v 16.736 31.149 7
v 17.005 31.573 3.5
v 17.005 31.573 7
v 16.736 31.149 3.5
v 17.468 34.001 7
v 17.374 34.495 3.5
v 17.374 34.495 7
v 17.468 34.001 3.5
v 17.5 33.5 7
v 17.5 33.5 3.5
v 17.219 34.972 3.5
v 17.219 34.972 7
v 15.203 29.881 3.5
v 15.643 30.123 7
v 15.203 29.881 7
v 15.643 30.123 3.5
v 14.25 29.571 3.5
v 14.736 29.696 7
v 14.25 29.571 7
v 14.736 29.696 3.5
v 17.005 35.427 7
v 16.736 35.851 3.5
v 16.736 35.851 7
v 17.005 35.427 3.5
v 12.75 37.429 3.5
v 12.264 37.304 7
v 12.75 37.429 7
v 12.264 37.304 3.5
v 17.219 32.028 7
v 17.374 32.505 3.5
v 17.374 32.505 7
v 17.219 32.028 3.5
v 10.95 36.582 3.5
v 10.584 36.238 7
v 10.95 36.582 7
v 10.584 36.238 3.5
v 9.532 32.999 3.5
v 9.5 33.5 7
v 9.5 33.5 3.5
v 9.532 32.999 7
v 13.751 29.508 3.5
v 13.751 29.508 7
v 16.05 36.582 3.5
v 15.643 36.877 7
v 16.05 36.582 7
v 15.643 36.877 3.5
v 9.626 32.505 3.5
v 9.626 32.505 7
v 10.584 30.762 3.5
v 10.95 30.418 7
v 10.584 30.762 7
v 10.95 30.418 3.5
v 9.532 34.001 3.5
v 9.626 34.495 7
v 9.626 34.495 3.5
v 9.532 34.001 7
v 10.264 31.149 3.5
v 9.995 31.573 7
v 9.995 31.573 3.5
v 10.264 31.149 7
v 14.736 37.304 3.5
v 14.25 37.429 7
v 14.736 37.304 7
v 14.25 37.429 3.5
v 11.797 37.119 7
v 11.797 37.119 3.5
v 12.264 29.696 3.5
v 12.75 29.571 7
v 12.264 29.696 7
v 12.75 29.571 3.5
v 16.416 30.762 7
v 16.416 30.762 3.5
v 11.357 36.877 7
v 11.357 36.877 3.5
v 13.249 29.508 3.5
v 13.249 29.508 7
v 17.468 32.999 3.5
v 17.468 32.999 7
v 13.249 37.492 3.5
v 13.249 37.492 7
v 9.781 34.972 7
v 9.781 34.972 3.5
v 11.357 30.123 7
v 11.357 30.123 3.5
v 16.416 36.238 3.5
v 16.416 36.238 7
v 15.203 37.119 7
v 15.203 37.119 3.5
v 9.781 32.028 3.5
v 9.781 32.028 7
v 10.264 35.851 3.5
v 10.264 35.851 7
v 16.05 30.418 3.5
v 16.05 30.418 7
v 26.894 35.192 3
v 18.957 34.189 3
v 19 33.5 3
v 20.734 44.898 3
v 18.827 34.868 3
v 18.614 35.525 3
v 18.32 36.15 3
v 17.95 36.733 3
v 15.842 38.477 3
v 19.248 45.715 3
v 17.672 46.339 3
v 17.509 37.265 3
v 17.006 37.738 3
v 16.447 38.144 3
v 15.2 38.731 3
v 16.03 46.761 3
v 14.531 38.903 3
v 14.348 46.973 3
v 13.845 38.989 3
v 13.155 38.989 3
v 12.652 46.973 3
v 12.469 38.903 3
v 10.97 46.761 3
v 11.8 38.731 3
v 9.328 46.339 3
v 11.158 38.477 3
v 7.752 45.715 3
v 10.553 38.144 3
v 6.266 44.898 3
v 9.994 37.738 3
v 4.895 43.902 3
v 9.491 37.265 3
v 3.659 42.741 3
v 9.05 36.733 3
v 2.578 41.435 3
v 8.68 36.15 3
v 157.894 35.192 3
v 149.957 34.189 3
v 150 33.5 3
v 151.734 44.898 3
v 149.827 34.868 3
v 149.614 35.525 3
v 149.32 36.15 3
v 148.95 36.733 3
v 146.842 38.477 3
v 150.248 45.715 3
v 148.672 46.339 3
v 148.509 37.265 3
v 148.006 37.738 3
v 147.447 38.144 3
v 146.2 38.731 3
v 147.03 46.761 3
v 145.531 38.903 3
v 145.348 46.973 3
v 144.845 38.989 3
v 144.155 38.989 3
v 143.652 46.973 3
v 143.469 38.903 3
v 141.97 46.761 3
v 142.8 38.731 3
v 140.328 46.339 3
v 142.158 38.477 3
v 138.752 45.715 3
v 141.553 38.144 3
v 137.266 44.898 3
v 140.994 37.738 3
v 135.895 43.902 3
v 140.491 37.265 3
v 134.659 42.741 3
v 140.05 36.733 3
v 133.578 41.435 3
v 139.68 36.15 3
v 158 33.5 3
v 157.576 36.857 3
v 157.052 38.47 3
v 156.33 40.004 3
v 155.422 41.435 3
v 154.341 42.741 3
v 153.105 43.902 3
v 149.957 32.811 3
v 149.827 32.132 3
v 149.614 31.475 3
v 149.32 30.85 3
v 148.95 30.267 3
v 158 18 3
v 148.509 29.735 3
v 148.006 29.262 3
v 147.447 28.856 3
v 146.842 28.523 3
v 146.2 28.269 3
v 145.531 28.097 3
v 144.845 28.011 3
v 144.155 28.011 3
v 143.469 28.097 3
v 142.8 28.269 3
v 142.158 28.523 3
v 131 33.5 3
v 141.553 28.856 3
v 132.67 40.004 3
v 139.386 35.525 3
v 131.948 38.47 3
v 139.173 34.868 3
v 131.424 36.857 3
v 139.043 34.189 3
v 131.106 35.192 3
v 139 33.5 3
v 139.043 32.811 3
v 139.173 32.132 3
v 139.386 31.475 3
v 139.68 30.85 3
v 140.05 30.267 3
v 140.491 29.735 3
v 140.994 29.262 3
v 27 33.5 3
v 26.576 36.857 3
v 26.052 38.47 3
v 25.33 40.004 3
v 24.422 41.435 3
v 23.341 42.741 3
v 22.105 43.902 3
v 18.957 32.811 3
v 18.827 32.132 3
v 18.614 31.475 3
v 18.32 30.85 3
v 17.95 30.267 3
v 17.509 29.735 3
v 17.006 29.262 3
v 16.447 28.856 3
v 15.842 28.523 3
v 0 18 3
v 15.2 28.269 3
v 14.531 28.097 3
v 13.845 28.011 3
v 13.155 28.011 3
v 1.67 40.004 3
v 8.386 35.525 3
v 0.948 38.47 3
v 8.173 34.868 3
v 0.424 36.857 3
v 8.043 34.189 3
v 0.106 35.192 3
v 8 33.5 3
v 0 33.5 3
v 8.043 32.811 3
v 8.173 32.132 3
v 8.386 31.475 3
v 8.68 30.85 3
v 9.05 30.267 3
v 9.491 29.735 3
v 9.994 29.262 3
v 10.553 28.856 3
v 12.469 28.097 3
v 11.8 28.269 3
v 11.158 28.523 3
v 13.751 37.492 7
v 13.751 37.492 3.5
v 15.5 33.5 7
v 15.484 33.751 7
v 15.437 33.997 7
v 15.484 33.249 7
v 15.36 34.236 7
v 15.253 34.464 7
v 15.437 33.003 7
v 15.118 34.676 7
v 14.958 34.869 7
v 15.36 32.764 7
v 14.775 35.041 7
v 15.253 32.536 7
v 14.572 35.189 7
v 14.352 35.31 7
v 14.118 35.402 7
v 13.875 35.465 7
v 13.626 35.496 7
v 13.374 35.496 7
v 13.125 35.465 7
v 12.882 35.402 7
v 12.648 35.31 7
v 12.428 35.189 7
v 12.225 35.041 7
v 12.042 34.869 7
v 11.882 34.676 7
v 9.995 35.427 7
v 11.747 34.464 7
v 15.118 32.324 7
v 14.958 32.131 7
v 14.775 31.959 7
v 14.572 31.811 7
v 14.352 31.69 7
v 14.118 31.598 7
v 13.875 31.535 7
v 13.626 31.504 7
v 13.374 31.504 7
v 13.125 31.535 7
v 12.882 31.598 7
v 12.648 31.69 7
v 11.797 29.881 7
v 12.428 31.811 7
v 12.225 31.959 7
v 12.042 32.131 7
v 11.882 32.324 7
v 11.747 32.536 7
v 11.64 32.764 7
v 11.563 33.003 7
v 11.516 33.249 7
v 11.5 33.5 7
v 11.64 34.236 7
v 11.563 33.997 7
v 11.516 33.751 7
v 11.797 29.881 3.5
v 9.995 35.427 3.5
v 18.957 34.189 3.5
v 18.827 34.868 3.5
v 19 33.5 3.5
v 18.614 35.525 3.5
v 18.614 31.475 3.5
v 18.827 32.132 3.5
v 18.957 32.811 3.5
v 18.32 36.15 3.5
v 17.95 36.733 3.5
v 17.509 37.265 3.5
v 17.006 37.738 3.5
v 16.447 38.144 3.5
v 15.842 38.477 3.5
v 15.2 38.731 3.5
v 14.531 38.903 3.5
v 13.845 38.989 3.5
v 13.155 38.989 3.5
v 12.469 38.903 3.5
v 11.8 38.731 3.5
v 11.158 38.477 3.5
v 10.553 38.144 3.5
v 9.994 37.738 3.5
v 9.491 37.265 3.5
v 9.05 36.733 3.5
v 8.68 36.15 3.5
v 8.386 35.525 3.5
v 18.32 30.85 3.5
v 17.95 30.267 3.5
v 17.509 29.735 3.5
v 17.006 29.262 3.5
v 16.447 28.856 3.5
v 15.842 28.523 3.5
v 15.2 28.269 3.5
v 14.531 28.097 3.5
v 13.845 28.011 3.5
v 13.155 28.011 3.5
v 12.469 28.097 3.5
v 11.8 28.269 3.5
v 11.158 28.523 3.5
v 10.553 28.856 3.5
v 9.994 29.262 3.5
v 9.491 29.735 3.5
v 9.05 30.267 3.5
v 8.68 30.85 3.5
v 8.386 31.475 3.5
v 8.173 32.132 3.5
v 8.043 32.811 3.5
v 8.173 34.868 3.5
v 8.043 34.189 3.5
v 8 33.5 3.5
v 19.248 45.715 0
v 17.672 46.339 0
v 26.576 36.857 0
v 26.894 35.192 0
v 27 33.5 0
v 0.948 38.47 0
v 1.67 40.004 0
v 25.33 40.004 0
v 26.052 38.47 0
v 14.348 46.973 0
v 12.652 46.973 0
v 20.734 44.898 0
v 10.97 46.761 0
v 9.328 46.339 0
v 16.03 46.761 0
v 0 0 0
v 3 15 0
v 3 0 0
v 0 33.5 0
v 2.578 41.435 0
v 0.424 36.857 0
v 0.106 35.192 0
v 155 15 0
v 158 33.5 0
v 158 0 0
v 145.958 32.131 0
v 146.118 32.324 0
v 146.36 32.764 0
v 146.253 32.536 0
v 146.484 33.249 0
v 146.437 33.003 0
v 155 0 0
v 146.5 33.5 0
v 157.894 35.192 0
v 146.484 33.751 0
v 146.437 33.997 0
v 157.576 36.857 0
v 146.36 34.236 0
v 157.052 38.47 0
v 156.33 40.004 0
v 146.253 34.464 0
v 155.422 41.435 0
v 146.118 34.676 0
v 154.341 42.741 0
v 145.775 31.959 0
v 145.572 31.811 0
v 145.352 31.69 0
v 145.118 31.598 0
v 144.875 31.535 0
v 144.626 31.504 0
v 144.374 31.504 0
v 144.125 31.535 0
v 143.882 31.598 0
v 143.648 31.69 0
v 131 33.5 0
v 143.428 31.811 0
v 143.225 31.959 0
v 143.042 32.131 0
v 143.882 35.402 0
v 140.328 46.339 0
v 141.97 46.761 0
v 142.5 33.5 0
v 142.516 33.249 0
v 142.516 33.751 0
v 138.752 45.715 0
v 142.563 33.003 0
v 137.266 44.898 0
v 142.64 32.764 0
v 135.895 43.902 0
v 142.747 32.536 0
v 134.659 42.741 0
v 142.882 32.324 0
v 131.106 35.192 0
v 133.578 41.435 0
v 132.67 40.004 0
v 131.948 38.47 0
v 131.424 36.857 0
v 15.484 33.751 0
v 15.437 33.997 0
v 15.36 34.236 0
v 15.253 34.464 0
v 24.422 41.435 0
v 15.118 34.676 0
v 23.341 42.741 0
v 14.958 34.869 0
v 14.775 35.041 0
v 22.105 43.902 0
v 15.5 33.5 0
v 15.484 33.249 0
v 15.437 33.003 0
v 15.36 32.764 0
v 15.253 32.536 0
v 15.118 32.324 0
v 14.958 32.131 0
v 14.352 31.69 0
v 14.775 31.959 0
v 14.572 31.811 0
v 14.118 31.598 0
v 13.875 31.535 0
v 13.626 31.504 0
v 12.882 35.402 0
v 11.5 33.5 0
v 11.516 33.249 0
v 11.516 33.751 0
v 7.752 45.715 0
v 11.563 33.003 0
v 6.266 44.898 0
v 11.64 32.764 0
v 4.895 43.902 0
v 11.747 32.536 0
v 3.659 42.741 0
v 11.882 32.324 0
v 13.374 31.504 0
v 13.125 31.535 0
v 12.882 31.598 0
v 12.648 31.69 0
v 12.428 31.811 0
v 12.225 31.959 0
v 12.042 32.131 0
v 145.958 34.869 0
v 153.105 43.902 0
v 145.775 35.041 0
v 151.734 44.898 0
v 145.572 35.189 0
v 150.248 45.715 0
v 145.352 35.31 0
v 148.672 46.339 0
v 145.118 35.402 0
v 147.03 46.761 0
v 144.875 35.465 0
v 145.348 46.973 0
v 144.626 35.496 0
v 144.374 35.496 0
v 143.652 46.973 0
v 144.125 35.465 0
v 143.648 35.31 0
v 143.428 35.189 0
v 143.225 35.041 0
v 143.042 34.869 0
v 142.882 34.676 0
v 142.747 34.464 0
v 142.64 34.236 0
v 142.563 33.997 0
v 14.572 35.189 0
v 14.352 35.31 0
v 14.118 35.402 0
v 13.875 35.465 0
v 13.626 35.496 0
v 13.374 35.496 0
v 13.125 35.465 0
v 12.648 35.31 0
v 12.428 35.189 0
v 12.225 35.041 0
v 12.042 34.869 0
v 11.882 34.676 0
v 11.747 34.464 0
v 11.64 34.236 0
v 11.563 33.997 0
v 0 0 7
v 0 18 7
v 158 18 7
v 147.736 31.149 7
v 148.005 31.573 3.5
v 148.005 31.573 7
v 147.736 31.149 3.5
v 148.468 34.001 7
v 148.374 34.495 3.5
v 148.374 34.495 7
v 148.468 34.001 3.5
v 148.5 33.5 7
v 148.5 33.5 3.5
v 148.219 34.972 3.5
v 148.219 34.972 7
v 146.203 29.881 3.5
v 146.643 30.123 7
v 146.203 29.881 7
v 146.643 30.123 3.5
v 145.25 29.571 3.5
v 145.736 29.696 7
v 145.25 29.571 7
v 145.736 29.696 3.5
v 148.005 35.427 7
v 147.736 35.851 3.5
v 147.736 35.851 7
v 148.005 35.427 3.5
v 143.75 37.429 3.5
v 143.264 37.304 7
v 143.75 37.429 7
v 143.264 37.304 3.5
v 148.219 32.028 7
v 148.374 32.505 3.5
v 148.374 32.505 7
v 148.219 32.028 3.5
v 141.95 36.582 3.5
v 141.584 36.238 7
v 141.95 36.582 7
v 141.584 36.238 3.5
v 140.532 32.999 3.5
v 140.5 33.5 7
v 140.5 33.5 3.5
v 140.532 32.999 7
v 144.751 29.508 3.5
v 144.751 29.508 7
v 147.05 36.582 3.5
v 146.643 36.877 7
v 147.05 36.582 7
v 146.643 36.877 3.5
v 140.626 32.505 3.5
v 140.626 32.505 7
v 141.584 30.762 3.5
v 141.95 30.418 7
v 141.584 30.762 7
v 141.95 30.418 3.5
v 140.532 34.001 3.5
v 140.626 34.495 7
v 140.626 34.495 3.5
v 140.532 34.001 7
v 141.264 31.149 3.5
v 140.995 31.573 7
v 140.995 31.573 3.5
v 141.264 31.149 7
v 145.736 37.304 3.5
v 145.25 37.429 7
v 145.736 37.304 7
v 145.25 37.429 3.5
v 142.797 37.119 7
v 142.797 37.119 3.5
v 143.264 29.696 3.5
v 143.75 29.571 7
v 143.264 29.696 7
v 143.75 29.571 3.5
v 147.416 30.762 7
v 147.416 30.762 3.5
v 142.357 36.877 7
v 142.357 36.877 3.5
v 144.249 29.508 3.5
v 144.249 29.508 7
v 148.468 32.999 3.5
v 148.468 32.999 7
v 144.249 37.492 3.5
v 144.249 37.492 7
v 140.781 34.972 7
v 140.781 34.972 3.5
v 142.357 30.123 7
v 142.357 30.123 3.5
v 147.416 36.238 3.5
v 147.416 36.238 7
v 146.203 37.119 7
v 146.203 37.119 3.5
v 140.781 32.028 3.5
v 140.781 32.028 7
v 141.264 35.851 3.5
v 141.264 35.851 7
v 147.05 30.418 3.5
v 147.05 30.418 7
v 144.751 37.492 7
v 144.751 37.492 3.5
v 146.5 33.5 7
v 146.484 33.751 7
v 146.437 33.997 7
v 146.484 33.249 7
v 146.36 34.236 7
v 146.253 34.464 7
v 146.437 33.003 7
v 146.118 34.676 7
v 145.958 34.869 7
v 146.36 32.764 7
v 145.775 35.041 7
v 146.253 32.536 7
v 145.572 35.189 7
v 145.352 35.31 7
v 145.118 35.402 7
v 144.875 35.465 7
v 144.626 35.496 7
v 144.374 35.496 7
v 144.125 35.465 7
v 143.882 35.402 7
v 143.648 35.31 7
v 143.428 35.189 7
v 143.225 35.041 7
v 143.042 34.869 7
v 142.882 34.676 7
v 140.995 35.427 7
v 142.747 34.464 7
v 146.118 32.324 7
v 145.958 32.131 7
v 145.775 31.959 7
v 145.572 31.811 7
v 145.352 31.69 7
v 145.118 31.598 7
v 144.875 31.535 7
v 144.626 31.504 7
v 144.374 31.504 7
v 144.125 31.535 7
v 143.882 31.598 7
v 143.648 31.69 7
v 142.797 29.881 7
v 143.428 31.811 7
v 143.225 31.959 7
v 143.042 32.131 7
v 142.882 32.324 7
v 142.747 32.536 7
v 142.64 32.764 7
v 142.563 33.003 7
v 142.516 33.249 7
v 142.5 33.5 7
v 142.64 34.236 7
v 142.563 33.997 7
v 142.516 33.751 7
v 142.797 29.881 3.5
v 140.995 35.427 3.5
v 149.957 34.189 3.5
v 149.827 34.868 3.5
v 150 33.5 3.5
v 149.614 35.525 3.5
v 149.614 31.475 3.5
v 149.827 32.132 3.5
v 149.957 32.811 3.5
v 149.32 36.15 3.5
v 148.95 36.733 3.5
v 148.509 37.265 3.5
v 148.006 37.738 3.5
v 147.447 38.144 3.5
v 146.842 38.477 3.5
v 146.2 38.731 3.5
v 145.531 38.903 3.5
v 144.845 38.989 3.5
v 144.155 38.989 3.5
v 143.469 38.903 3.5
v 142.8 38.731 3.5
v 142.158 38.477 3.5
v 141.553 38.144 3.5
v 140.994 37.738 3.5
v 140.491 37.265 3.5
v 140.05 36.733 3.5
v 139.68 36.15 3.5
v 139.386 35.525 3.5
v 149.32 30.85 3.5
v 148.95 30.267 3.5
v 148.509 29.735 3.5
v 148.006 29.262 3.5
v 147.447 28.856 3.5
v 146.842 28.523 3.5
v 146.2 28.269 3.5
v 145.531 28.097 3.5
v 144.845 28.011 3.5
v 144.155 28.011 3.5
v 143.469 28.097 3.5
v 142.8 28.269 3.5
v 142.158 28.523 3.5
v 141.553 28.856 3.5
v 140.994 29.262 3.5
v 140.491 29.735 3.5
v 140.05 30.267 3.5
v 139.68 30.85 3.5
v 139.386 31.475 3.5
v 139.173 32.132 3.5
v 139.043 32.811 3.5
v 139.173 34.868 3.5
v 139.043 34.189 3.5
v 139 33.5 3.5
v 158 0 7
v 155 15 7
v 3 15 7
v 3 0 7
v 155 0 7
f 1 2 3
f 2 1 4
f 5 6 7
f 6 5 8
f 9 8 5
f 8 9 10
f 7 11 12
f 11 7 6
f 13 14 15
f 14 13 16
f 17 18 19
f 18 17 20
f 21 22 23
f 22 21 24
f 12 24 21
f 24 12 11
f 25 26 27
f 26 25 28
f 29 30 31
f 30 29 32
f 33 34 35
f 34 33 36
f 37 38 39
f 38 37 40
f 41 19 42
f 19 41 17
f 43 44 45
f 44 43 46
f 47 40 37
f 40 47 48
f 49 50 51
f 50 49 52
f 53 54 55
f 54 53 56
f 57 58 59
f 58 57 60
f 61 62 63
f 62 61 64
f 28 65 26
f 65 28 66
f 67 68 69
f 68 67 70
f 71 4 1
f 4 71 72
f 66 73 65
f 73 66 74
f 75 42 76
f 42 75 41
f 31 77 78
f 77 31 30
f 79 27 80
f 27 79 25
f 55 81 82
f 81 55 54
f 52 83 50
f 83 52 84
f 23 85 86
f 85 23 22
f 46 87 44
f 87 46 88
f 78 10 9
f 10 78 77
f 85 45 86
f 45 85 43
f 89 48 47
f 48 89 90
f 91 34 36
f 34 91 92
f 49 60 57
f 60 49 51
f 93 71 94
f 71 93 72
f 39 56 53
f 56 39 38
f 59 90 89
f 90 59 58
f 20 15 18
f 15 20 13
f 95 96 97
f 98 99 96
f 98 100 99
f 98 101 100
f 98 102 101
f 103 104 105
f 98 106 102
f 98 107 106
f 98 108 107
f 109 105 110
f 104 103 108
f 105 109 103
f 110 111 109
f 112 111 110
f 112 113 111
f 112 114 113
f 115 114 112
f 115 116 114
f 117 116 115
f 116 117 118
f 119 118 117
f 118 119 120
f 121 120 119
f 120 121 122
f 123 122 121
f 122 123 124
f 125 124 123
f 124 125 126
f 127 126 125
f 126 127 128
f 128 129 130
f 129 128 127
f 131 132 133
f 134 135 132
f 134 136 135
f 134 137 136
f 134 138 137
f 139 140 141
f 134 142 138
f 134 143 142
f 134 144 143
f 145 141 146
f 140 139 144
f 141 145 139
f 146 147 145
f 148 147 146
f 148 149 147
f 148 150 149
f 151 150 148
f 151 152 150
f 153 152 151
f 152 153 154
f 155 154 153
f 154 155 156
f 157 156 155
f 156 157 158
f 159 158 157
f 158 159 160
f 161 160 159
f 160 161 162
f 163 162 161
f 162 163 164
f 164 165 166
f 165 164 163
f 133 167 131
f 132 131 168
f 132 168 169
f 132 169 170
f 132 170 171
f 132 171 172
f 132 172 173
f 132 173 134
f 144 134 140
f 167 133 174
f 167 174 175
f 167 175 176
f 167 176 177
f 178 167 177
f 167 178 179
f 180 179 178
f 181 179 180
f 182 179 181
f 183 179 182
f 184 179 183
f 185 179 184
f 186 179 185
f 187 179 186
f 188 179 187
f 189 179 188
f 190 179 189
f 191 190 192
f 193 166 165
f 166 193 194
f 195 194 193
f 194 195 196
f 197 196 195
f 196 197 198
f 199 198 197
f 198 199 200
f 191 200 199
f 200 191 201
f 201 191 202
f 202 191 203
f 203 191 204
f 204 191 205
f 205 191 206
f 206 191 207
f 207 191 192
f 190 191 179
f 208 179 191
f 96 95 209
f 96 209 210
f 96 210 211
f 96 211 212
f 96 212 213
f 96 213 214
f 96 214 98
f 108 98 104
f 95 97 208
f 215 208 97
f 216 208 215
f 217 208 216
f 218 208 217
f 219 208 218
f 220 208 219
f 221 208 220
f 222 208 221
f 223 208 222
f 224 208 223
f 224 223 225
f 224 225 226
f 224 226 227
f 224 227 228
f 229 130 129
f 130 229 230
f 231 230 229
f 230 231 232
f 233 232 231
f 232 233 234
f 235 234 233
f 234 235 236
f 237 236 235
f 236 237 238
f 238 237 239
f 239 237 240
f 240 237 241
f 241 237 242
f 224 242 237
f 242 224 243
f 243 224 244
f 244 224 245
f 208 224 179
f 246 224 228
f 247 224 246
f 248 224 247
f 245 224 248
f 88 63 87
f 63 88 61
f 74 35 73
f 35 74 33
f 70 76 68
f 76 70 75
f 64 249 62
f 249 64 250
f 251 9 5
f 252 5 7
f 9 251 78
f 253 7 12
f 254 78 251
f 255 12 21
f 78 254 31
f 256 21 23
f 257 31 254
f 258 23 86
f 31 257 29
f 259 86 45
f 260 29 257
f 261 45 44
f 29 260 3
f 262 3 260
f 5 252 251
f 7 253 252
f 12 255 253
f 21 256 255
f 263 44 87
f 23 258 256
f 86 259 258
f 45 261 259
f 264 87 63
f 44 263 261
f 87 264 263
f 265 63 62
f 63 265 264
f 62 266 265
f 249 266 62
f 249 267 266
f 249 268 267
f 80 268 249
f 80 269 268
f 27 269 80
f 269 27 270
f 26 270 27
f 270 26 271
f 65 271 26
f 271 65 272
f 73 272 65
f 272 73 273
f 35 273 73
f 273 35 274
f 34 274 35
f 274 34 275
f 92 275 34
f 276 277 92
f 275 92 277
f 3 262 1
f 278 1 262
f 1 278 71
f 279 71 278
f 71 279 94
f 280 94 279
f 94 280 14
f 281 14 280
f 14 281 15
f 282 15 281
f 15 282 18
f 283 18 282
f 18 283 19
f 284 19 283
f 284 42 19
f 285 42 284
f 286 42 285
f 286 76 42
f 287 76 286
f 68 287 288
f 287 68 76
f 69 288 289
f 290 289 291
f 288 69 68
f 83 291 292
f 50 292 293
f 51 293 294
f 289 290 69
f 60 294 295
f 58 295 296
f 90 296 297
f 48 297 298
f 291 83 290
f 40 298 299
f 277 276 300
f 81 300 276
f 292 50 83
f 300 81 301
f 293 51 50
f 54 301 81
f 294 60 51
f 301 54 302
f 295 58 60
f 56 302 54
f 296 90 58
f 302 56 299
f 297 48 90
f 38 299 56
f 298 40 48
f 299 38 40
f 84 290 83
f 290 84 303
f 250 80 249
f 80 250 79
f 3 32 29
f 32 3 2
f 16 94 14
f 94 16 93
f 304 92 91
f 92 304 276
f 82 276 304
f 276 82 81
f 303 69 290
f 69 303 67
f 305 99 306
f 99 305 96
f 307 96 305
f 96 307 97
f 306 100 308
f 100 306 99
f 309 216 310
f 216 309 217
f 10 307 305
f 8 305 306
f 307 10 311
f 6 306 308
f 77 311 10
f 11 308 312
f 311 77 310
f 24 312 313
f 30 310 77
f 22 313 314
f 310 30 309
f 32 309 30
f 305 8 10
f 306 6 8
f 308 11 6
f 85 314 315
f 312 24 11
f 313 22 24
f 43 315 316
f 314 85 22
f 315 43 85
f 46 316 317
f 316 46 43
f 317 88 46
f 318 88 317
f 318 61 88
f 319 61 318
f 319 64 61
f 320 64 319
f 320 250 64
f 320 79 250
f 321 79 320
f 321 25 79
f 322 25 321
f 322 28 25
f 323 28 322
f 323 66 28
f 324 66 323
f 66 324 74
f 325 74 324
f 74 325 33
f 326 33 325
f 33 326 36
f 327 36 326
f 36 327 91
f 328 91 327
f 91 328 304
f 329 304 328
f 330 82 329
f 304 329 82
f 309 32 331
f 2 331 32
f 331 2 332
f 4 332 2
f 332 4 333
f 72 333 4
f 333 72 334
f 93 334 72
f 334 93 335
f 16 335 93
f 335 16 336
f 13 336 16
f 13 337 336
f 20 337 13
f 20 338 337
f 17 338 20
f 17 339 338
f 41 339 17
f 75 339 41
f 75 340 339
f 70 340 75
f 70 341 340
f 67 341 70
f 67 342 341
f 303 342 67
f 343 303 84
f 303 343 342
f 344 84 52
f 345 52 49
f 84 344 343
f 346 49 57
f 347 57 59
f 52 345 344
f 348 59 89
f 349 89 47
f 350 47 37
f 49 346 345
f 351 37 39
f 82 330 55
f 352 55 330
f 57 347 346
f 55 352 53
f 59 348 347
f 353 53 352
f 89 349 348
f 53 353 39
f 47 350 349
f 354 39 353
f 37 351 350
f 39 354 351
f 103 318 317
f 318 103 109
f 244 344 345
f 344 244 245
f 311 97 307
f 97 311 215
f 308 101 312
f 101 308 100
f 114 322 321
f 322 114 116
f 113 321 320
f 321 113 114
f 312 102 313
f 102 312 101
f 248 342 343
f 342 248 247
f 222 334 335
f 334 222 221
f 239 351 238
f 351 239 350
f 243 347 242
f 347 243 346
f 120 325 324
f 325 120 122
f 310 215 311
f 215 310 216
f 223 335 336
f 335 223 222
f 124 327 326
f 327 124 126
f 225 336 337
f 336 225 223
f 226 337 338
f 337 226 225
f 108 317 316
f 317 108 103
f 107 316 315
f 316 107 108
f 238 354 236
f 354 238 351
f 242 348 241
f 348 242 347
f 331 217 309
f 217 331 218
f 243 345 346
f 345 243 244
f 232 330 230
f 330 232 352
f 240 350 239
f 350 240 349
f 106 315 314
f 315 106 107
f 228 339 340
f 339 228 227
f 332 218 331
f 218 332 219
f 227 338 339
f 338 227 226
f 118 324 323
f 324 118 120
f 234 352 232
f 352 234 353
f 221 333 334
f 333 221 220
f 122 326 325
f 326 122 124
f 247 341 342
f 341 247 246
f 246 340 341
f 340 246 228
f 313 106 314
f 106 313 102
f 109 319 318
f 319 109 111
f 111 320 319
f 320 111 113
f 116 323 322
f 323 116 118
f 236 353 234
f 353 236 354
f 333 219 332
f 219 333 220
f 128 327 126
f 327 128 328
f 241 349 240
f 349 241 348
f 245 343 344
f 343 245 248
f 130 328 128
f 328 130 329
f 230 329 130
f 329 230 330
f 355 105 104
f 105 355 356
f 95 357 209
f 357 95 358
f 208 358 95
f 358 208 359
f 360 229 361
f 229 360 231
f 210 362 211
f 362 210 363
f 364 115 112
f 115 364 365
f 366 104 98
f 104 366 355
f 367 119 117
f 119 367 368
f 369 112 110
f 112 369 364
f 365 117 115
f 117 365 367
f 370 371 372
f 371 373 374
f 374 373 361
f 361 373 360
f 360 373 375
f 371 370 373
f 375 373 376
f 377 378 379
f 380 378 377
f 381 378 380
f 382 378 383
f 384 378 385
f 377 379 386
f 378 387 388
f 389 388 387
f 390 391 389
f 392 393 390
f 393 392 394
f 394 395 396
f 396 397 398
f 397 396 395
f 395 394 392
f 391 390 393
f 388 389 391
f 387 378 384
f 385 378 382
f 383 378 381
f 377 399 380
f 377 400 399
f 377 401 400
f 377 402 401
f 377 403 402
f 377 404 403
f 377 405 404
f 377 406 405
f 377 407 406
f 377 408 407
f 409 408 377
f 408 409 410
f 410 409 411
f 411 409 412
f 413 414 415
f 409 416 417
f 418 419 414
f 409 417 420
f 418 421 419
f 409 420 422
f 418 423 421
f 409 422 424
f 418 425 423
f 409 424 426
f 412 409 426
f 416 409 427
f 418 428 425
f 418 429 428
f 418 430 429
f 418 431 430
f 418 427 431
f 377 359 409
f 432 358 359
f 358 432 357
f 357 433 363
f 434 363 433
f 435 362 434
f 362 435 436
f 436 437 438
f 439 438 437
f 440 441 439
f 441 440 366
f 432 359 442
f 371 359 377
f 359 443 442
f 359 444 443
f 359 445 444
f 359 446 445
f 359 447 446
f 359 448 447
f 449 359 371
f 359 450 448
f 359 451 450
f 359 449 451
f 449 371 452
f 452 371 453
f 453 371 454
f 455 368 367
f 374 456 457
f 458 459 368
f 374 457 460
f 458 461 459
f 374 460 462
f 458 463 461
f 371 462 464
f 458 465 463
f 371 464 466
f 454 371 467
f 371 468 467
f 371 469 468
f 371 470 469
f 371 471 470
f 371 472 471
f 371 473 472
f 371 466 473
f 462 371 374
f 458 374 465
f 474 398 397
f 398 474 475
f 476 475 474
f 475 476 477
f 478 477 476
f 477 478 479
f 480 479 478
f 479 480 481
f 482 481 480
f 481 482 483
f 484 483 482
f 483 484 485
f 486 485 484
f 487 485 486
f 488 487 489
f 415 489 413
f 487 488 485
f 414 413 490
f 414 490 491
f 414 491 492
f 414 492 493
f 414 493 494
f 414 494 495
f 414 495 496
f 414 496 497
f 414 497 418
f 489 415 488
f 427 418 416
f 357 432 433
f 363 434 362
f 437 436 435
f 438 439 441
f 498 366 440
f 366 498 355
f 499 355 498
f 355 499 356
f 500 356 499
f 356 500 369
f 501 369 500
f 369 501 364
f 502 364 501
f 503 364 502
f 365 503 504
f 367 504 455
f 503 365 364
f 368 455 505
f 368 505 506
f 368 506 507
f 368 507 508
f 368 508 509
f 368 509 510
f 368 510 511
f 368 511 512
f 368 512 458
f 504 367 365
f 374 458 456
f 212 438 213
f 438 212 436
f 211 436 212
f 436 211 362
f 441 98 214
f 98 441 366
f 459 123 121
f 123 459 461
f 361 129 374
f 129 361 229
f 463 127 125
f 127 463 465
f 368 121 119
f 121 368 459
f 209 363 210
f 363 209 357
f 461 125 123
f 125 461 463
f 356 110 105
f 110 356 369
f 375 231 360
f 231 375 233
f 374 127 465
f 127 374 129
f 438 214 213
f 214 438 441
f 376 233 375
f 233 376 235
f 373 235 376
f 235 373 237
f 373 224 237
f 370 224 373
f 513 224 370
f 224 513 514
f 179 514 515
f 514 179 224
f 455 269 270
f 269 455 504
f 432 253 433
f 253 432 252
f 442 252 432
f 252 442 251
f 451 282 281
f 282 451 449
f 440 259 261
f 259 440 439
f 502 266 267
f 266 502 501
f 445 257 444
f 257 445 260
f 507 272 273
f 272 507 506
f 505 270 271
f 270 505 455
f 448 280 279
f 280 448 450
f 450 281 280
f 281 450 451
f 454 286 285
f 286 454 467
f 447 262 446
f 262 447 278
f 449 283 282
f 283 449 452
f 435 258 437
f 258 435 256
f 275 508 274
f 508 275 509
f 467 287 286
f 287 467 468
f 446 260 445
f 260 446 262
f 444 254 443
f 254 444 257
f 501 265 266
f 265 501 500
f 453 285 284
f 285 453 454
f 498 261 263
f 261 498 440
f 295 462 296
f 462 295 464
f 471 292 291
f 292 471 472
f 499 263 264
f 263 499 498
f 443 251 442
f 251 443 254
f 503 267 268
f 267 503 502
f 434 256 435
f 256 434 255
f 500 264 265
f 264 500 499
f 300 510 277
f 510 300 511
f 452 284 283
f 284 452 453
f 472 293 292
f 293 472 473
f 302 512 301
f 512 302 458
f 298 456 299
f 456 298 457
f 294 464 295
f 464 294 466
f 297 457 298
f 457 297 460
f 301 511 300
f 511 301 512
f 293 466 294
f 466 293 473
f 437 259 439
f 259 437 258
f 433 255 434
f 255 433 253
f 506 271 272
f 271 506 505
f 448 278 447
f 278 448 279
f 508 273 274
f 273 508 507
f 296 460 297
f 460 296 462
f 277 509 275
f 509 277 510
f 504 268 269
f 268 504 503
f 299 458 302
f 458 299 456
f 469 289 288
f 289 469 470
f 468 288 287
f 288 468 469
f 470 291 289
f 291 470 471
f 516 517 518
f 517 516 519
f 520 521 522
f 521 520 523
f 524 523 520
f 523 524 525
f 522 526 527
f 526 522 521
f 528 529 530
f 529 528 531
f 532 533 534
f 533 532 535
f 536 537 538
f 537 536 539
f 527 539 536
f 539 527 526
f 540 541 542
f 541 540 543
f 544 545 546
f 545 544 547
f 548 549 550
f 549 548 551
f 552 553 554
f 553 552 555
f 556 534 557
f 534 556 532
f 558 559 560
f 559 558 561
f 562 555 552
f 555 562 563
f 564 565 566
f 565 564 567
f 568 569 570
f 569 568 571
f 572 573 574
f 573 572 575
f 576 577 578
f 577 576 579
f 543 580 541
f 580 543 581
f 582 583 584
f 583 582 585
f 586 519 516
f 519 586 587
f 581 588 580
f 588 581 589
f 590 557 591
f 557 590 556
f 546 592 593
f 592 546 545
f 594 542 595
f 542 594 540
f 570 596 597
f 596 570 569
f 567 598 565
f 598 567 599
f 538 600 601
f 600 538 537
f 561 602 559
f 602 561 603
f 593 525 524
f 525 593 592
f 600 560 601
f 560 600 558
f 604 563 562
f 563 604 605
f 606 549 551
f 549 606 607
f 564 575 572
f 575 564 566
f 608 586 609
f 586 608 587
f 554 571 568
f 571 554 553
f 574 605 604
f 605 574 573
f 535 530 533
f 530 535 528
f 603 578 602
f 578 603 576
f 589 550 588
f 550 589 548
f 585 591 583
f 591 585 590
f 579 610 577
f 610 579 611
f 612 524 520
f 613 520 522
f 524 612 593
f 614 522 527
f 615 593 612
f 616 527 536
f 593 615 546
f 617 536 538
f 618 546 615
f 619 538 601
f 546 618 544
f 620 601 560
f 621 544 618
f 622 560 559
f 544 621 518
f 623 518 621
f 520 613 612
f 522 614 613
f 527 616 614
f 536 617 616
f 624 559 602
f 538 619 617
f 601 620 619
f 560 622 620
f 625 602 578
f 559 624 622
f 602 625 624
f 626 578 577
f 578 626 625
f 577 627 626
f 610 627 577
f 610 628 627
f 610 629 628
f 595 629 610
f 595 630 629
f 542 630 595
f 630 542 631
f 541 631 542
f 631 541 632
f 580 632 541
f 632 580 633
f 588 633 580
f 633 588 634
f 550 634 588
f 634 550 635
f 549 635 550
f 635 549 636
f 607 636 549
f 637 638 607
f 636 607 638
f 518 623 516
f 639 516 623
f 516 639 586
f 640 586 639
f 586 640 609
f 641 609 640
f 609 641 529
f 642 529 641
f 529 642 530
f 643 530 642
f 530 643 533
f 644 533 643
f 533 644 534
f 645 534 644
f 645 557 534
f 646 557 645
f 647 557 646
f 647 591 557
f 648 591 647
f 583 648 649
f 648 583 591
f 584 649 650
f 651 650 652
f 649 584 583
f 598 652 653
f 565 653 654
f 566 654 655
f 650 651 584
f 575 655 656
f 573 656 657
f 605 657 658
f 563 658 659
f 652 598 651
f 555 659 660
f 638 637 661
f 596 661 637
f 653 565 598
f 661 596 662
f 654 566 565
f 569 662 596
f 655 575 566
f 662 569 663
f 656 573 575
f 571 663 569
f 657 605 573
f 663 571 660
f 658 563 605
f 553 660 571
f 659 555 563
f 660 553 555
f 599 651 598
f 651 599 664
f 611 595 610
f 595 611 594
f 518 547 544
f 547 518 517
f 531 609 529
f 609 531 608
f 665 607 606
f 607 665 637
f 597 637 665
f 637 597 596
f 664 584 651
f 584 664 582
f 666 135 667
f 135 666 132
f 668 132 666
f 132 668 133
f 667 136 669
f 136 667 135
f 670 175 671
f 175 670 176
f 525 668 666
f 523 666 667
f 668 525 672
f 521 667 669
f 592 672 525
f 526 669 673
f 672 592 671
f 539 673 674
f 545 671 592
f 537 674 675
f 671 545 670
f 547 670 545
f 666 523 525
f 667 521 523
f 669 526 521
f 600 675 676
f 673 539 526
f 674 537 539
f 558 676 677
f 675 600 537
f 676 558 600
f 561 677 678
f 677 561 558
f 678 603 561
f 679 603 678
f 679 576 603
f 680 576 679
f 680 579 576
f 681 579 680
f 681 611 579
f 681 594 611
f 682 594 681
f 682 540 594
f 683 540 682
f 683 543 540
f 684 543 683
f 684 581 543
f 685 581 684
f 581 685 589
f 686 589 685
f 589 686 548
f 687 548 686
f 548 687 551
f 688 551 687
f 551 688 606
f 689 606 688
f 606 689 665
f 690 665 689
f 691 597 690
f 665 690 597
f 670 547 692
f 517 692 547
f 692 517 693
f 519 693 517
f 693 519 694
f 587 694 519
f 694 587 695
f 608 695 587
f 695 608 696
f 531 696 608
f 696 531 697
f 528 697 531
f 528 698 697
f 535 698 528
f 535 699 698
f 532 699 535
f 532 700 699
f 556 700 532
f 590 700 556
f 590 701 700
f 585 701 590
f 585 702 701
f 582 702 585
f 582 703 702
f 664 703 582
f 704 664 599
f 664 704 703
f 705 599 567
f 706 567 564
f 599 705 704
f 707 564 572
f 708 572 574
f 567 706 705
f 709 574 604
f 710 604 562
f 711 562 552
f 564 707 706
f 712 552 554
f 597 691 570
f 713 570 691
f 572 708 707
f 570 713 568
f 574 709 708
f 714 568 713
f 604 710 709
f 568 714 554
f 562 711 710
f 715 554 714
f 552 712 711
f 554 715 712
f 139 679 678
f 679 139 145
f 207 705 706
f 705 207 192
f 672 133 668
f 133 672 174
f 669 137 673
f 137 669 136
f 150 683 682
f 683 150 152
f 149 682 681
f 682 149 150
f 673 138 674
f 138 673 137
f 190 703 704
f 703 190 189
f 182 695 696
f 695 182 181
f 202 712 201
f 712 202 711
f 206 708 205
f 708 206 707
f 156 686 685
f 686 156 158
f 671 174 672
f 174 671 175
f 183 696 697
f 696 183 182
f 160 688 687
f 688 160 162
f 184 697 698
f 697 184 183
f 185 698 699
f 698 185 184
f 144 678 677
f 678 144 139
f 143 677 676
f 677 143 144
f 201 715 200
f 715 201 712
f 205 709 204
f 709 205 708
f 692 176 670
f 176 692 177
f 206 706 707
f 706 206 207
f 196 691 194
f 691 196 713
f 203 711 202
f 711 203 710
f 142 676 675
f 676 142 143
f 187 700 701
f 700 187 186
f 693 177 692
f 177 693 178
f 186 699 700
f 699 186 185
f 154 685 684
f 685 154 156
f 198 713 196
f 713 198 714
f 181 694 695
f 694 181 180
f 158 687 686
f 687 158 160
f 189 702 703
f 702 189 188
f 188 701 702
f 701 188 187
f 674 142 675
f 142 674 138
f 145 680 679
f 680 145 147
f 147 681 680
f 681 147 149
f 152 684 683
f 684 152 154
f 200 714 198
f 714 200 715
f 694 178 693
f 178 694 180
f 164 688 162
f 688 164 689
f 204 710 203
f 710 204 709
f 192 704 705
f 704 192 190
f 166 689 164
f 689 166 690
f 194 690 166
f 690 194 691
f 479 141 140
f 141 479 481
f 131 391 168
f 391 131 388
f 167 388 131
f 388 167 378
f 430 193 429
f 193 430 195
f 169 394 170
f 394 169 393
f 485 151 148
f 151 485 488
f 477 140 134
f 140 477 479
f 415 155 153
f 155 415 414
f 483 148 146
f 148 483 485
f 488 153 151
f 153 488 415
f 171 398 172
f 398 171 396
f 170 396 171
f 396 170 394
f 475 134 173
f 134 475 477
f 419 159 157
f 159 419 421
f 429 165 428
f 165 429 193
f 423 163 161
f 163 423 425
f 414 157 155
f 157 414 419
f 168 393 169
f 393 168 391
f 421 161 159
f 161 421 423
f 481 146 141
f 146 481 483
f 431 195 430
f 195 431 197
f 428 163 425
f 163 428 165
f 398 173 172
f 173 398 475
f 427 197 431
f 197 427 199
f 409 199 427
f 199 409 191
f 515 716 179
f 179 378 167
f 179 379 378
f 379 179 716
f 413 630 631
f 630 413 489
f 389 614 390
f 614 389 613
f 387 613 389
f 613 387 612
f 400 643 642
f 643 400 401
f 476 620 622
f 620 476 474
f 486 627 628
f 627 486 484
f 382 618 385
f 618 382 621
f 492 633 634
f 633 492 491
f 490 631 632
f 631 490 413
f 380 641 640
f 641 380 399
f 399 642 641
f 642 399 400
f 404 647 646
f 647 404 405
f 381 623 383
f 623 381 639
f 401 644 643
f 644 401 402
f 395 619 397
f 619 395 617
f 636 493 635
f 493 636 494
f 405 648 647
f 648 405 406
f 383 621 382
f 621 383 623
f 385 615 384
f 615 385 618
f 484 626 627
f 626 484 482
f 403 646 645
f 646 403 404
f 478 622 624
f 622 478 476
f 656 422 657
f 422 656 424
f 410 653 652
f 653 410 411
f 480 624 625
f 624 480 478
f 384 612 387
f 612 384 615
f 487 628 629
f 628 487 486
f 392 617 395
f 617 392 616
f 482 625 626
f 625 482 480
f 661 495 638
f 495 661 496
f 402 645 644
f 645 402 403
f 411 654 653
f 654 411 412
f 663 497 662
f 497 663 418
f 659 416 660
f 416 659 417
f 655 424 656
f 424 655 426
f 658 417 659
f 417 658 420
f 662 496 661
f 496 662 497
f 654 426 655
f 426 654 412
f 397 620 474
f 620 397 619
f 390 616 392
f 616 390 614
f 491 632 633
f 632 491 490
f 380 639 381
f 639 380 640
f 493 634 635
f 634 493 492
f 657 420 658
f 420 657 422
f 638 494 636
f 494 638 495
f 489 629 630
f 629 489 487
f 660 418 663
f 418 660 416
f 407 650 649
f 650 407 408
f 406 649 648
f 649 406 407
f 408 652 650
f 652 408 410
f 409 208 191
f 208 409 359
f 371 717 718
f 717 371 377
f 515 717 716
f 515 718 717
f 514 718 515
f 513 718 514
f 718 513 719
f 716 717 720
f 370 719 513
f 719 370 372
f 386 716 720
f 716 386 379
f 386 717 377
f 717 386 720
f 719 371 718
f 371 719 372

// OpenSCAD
/* == Customizer Settings ================================================ */
/*[Gimbal Settings]*/

// in mm, e.g. control box width (with clamps) or outer dimensions (without clamps)
inner_bracket_width = 152; // v1.1: raised from 150 to gain some additional play
//inner_bracket_width = 125; // TUSH dimensions

// in mm, base material thickness of all parts
base_thickness = 3.0;

// in mm, optionally add some thickness to the spool guide and clamp to gain stability
additional_thickness = 0; // v1.3: added parameter, 0 for regular version
//additional_thickness = 7; // v1.3: broad version

// in mm, 0 for no hole
//screw_hole_diameter = 0.0;
screw_hole_diameter = 4; // v1.3: used for all new SLTs

// in mm, 0 for no clamps (inner bracket width will become outer width)
clamp_thickness = 3;

// in mm, 0 for no clamps
clamp_pin_length = 15;
//clamp_pin_length = 0; // TUSH dimensions

// in mm, raise bearings further from surface
bearing_padding_bottom = 2;

// in mm, lower/raise distance between bearings
bearing_distance_offset = 0;
//bearing_distance_offset = -33; // Small Spool (TUSH dimensions) for Tornado Box

// in mm, affects minimum spool guide diameter
bearing_diameter = 22;

// in mm, affects axis height
bearing_thickness = 7;

// in mm, affects axis diameter
bearing_bore = 8;

// in mm, affects height of bearing spacer, 0 for no spacer
bearing_spacer_height_offset = 0.5;

// in mm, affects radius of bearing spacer
bearing_spacer_radius_offset = 1.5;

// in mm, increases fixture diameter to keep spool on bearings
spool_guide_offset = 5;

// Surface detail level
resolution = 50; // [30:Draft, 50:Normal, 80:Smooth]


/* == Draw Spool Holder ================================================== */
spool_guide_diameter = bearing_diameter + spool_guide_offset;
SpoolHodler($fn=resolution);


/* == Modules ============================================================ */

/* Click-in (TUSH like) bearing fixture
 axis_diameter - inner diameter of the bearing
 axis_height - thickness of the bearing / 2
 guide_diameter - outer diameter of the spool guide
 padding_bottom - additional spacing between bearing and fixture base
 spacer_radius_offset - radius of the optional bearing spacer
 spacer_height_offset - height of the optional bearing spacer
 screw_diameter - diameter of the optional bolt hole
 thickness - thickness of the base material
 res - resolution
*/
module BearingFixture(axis_diameter = bearing_bore, axis_height = bearing_thickness/2,
                      guide_diameter = spool_guide_diameter,
                      padding_bottom = bearing_padding_bottom,
                      spacer_radius_offset = bearing_spacer_radius_offset,
                      spacer_height_offset = bearing_spacer_height_offset,
                      screw_diameter = screw_hole_diameter,
                      thickness = base_thickness, add_thickness = additional_thickness,
                      res = resolution) {
    difference() {
        union() {
            translate([guide_diameter/2, guide_diameter/2 + padding_bottom, 0]) {
                translate([0,0,thickness+add_thickness]) {
                    // axis
                    cylinder(h = spacer_height_offset + axis_height,
                             d = axis_diameter, $fn = res);
                    // bearing axis wheel spacer
                    cylinder(h = spacer_height_offset,
                             d = axis_diameter + spacer_radius_offset*2,
                             $fn = res);
                }
                // upper (rounded) base
                cylinder(h = thickness+add_thickness, d = guide_diameter, $fn = res);
            }
            // lower (rectangular) base
            cube([guide_diameter, guide_diameter/2 + padding_bottom, thickness+add_thickness]);
        }
        // axis bolt hole
        translate([guide_diameter/2, guide_diameter/2 + padding_bottom, -1]) {
            cylinder(h = thickness+add_thickness + axis_height + 2, d = screw_diameter, $fn = res);
        }
    }
}
//BearingFixture();

/* Basic spool holder comprised of two bridged BearingFixtures */
module BasicSpoolHoder() {
    thickness = base_thickness;
    base_width = inner_bracket_width + 2 * clamp_thickness - spool_guide_diameter
                 + bearing_distance_offset;
    base_height = max(clamp_thickness, thickness) + spool_guide_diameter/2
                  + bearing_padding_bottom;

    union() {
        // left bearing fixture
        translate([0,max(clamp_thickness, thickness),0]) {
            BearingFixture();
        }
        // bridge between bearing fixtures
        translate([spool_guide_diameter,0,0]) {
            cube([base_width - spool_guide_diameter, base_height, thickness]);
        }
        // spacer bettween two fixtures
        cube([base_width + spool_guide_diameter, max(clamp_thickness, thickness),
              thickness + bearing_thickness/2 + bearing_spacer_height_offset]);
        // reight bearing fixture
        translate([base_width,max(clamp_thickness, thickness),0]) {
            BearingFixture();
        }
    }
}
//BasicSpoolHoder();

/* Spool holder comprised of the BasicSpoolHoder and (optional) "clamp" brackets */
module SpoolHodler() {
    clamp_thickness_z = base_thickness + additional_thickness + bearing_thickness/2 + bearing_spacer_height_offset;

    union() {
        translate([-bearing_distance_offset/2,clamp_pin_length,0]) {
            BasicSpoolHoder();
        }
        if (bearing_distance_offset < 0 && bearing_distance_offset < -clamp_thickness) {
            UClampSoft(w = inner_bracket_width, h = clamp_pin_length, d = clamp_thickness,
                    dz = clamp_thickness_z);
        } else {
            UClamp(w = inner_bracket_width, h = clamp_pin_length, d = clamp_thickness,
                   dz = clamp_thickness_z);

        }
    }
}
//SpoolHodler();

/* U-shaped "clamp" (bracket) based on inner dimensions and thickness
 [w] inner width (space between two pins)
 [h] inner height (pin length)
 [d] clamp diameter
 [dz] clamp z diameter
*/
module UClamp(w, h, d, dz) {
    difference() {
        cube([w+2*d,h+d,dz]);
        translate([d,-1,-1]) {
            cube([w,h+1,dz+2]);
        }
    }
}
//UClamp(10,10,10,10);
//UClamp(20,10,15,8);

/* U-shaped "clamp" (bracket) based on inner dimensions and thickness
 [w] inner width (space between two pins)
 [h] inner height (pin length)
 [d] clamp diameter
 [dz] clamp z diameter (thtickness)
*/
module UClampSoft(w, h, d, dz) {
    module UCLeft() {
        union() {
            hull() {
                cube([d,h,dz]);
                translate([d/2,d/2+h,0]) cylinder(d=d, h=dz);
            }
            hull() {
                translate([d,h,0]) cube([w/2,d,dz]);
                translate([d/2,d/2+h,0]) cylinder(d=d, h=dz);
            }
        }
    }
   union() {
       UCLeft();
       translate([w+2*d,0,0]) mirror([1,0,0]) UCLeft();
   }
}
//UClampSoft(20,10,15,8);
